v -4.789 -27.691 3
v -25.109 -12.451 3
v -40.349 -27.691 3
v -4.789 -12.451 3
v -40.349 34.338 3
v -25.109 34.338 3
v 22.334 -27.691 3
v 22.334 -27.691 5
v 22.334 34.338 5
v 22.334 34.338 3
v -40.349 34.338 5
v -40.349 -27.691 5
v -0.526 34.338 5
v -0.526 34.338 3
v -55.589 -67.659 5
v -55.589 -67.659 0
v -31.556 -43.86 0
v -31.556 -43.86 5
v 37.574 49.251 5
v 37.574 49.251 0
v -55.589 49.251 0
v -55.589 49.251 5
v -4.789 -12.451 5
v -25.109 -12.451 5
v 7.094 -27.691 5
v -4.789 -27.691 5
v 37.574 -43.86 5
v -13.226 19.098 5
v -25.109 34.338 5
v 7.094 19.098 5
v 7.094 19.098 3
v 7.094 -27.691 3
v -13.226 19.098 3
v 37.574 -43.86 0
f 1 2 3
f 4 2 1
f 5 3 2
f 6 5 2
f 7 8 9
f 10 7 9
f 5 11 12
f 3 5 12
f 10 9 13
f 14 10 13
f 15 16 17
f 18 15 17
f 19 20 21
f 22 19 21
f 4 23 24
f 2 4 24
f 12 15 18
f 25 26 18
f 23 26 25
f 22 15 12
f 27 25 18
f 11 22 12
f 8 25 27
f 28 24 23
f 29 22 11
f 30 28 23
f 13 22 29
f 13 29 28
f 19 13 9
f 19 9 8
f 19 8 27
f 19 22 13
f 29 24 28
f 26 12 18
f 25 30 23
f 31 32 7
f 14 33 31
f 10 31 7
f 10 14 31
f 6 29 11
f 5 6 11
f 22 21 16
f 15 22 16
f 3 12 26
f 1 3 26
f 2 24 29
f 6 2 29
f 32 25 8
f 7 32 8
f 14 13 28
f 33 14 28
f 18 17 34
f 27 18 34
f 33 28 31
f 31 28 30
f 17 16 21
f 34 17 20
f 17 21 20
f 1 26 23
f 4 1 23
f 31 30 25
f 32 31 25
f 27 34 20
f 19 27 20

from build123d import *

# Parameters (mm, degrees)
F1_DEPTH = 5
F3_DEPTH = 2


with BuildPart() as f1:
    # F0 (on Top) → F1 (new body)
    with BuildSketch(Plane.XY):
        Polygon((37.573822, 49.251007), (-55.58905, 49.251007), (-55.58905, -67.659264), (-31.55629, -43.860067), (37.573822, -43.860067), align=None)
    extrude(amount=F1_DEPTH)

    # F2 (on face) → F3 (cut)
    with BuildSketch(Plane.XY.offset(5)):
        Polygon((-25.10905, 34.337802), (-40.34905, 34.337802), (-40.34905, -27.690759), (-4.78905, -27.690759), (-4.78905, -12.450759), (-25.10905, -12.450759), align=None)
        Polygon((22.333822, 34.337802), (-0.526178, 34.337802), (-13.226178, 19.097802), (7.093822, 19.097802), (7.093822, -27.690759), (22.333822, -27.690759), align=None)
    extrude(amount=-F3_DEPTH, mode=Mode.SUBTRACT)


solid = f1.part
